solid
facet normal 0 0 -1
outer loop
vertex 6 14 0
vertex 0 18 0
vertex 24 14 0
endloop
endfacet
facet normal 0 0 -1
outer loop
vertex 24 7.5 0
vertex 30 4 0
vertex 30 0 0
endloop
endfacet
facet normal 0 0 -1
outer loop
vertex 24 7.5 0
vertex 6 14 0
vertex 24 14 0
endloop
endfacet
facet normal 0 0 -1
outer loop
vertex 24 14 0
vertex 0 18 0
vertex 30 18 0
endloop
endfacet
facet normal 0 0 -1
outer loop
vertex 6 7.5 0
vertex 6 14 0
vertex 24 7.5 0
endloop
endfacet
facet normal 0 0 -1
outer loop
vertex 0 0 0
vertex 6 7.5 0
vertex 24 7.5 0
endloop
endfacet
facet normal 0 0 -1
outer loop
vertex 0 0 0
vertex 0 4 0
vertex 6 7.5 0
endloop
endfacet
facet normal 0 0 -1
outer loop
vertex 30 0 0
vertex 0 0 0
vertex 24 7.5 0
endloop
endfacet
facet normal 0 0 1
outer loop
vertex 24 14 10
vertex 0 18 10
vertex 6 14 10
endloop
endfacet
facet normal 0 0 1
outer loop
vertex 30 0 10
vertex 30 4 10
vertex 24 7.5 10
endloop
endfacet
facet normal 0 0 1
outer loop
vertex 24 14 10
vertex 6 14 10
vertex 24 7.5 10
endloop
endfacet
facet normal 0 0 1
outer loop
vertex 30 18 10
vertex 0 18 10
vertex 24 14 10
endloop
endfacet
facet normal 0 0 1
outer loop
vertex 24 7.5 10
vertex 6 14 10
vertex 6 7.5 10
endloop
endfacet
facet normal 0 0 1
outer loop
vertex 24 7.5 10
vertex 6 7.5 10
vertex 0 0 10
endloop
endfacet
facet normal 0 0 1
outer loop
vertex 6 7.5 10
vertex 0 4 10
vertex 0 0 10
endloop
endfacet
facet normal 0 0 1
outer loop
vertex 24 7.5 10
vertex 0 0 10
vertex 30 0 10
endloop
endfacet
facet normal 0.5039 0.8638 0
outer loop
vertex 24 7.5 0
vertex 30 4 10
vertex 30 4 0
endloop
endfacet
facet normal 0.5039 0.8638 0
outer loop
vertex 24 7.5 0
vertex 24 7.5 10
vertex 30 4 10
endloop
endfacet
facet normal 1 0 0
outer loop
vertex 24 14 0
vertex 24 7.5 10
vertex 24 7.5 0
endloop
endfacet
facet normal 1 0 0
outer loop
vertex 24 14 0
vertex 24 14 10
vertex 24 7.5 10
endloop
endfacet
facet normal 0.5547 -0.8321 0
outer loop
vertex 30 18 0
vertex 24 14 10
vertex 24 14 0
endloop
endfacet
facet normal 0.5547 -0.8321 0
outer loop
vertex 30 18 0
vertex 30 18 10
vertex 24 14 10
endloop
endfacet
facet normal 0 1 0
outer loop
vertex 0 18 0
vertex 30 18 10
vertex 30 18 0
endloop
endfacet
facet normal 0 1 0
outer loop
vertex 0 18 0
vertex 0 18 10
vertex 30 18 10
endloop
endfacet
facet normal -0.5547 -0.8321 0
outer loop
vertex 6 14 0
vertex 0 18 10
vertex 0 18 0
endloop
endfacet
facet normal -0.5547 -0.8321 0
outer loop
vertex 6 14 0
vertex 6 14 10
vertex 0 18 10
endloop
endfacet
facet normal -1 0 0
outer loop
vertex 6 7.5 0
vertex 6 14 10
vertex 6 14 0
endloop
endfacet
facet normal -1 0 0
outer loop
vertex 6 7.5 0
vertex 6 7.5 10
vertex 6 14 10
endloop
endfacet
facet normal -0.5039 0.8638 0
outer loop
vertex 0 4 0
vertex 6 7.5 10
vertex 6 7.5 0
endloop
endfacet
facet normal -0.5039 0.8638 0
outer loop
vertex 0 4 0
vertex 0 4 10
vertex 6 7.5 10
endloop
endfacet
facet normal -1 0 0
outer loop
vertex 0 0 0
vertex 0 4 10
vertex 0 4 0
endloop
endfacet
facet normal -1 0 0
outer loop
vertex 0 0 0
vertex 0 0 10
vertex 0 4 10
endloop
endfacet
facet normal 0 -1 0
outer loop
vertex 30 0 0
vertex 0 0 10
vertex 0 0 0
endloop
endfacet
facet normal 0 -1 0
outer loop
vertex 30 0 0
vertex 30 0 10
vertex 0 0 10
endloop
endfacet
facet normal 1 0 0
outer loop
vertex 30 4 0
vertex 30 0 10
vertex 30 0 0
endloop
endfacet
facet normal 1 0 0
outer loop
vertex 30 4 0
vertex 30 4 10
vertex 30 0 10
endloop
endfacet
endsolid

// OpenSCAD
$fn = 32;

// ----------------------------------------------------------------------
// Key bar: dovetail key, 10 mm thick
// ----------------------------------------------------------------------

// --- parameters (mm) ---
profile_height = 10;      // extrusion height
profile_points = 10;      // points of the closed outline

profile = [[0, 0], [30, 0], [30, 4], [24, 7.5], [24, 14], [30, 18], [0, 18], [6, 14], [6, 7.5], [0, 4]];  // single closed polygon, 10 points, counter clockwise

// --- the one profile operation ---
linear_extrude(height = profile_height) polygon(points = profile);
